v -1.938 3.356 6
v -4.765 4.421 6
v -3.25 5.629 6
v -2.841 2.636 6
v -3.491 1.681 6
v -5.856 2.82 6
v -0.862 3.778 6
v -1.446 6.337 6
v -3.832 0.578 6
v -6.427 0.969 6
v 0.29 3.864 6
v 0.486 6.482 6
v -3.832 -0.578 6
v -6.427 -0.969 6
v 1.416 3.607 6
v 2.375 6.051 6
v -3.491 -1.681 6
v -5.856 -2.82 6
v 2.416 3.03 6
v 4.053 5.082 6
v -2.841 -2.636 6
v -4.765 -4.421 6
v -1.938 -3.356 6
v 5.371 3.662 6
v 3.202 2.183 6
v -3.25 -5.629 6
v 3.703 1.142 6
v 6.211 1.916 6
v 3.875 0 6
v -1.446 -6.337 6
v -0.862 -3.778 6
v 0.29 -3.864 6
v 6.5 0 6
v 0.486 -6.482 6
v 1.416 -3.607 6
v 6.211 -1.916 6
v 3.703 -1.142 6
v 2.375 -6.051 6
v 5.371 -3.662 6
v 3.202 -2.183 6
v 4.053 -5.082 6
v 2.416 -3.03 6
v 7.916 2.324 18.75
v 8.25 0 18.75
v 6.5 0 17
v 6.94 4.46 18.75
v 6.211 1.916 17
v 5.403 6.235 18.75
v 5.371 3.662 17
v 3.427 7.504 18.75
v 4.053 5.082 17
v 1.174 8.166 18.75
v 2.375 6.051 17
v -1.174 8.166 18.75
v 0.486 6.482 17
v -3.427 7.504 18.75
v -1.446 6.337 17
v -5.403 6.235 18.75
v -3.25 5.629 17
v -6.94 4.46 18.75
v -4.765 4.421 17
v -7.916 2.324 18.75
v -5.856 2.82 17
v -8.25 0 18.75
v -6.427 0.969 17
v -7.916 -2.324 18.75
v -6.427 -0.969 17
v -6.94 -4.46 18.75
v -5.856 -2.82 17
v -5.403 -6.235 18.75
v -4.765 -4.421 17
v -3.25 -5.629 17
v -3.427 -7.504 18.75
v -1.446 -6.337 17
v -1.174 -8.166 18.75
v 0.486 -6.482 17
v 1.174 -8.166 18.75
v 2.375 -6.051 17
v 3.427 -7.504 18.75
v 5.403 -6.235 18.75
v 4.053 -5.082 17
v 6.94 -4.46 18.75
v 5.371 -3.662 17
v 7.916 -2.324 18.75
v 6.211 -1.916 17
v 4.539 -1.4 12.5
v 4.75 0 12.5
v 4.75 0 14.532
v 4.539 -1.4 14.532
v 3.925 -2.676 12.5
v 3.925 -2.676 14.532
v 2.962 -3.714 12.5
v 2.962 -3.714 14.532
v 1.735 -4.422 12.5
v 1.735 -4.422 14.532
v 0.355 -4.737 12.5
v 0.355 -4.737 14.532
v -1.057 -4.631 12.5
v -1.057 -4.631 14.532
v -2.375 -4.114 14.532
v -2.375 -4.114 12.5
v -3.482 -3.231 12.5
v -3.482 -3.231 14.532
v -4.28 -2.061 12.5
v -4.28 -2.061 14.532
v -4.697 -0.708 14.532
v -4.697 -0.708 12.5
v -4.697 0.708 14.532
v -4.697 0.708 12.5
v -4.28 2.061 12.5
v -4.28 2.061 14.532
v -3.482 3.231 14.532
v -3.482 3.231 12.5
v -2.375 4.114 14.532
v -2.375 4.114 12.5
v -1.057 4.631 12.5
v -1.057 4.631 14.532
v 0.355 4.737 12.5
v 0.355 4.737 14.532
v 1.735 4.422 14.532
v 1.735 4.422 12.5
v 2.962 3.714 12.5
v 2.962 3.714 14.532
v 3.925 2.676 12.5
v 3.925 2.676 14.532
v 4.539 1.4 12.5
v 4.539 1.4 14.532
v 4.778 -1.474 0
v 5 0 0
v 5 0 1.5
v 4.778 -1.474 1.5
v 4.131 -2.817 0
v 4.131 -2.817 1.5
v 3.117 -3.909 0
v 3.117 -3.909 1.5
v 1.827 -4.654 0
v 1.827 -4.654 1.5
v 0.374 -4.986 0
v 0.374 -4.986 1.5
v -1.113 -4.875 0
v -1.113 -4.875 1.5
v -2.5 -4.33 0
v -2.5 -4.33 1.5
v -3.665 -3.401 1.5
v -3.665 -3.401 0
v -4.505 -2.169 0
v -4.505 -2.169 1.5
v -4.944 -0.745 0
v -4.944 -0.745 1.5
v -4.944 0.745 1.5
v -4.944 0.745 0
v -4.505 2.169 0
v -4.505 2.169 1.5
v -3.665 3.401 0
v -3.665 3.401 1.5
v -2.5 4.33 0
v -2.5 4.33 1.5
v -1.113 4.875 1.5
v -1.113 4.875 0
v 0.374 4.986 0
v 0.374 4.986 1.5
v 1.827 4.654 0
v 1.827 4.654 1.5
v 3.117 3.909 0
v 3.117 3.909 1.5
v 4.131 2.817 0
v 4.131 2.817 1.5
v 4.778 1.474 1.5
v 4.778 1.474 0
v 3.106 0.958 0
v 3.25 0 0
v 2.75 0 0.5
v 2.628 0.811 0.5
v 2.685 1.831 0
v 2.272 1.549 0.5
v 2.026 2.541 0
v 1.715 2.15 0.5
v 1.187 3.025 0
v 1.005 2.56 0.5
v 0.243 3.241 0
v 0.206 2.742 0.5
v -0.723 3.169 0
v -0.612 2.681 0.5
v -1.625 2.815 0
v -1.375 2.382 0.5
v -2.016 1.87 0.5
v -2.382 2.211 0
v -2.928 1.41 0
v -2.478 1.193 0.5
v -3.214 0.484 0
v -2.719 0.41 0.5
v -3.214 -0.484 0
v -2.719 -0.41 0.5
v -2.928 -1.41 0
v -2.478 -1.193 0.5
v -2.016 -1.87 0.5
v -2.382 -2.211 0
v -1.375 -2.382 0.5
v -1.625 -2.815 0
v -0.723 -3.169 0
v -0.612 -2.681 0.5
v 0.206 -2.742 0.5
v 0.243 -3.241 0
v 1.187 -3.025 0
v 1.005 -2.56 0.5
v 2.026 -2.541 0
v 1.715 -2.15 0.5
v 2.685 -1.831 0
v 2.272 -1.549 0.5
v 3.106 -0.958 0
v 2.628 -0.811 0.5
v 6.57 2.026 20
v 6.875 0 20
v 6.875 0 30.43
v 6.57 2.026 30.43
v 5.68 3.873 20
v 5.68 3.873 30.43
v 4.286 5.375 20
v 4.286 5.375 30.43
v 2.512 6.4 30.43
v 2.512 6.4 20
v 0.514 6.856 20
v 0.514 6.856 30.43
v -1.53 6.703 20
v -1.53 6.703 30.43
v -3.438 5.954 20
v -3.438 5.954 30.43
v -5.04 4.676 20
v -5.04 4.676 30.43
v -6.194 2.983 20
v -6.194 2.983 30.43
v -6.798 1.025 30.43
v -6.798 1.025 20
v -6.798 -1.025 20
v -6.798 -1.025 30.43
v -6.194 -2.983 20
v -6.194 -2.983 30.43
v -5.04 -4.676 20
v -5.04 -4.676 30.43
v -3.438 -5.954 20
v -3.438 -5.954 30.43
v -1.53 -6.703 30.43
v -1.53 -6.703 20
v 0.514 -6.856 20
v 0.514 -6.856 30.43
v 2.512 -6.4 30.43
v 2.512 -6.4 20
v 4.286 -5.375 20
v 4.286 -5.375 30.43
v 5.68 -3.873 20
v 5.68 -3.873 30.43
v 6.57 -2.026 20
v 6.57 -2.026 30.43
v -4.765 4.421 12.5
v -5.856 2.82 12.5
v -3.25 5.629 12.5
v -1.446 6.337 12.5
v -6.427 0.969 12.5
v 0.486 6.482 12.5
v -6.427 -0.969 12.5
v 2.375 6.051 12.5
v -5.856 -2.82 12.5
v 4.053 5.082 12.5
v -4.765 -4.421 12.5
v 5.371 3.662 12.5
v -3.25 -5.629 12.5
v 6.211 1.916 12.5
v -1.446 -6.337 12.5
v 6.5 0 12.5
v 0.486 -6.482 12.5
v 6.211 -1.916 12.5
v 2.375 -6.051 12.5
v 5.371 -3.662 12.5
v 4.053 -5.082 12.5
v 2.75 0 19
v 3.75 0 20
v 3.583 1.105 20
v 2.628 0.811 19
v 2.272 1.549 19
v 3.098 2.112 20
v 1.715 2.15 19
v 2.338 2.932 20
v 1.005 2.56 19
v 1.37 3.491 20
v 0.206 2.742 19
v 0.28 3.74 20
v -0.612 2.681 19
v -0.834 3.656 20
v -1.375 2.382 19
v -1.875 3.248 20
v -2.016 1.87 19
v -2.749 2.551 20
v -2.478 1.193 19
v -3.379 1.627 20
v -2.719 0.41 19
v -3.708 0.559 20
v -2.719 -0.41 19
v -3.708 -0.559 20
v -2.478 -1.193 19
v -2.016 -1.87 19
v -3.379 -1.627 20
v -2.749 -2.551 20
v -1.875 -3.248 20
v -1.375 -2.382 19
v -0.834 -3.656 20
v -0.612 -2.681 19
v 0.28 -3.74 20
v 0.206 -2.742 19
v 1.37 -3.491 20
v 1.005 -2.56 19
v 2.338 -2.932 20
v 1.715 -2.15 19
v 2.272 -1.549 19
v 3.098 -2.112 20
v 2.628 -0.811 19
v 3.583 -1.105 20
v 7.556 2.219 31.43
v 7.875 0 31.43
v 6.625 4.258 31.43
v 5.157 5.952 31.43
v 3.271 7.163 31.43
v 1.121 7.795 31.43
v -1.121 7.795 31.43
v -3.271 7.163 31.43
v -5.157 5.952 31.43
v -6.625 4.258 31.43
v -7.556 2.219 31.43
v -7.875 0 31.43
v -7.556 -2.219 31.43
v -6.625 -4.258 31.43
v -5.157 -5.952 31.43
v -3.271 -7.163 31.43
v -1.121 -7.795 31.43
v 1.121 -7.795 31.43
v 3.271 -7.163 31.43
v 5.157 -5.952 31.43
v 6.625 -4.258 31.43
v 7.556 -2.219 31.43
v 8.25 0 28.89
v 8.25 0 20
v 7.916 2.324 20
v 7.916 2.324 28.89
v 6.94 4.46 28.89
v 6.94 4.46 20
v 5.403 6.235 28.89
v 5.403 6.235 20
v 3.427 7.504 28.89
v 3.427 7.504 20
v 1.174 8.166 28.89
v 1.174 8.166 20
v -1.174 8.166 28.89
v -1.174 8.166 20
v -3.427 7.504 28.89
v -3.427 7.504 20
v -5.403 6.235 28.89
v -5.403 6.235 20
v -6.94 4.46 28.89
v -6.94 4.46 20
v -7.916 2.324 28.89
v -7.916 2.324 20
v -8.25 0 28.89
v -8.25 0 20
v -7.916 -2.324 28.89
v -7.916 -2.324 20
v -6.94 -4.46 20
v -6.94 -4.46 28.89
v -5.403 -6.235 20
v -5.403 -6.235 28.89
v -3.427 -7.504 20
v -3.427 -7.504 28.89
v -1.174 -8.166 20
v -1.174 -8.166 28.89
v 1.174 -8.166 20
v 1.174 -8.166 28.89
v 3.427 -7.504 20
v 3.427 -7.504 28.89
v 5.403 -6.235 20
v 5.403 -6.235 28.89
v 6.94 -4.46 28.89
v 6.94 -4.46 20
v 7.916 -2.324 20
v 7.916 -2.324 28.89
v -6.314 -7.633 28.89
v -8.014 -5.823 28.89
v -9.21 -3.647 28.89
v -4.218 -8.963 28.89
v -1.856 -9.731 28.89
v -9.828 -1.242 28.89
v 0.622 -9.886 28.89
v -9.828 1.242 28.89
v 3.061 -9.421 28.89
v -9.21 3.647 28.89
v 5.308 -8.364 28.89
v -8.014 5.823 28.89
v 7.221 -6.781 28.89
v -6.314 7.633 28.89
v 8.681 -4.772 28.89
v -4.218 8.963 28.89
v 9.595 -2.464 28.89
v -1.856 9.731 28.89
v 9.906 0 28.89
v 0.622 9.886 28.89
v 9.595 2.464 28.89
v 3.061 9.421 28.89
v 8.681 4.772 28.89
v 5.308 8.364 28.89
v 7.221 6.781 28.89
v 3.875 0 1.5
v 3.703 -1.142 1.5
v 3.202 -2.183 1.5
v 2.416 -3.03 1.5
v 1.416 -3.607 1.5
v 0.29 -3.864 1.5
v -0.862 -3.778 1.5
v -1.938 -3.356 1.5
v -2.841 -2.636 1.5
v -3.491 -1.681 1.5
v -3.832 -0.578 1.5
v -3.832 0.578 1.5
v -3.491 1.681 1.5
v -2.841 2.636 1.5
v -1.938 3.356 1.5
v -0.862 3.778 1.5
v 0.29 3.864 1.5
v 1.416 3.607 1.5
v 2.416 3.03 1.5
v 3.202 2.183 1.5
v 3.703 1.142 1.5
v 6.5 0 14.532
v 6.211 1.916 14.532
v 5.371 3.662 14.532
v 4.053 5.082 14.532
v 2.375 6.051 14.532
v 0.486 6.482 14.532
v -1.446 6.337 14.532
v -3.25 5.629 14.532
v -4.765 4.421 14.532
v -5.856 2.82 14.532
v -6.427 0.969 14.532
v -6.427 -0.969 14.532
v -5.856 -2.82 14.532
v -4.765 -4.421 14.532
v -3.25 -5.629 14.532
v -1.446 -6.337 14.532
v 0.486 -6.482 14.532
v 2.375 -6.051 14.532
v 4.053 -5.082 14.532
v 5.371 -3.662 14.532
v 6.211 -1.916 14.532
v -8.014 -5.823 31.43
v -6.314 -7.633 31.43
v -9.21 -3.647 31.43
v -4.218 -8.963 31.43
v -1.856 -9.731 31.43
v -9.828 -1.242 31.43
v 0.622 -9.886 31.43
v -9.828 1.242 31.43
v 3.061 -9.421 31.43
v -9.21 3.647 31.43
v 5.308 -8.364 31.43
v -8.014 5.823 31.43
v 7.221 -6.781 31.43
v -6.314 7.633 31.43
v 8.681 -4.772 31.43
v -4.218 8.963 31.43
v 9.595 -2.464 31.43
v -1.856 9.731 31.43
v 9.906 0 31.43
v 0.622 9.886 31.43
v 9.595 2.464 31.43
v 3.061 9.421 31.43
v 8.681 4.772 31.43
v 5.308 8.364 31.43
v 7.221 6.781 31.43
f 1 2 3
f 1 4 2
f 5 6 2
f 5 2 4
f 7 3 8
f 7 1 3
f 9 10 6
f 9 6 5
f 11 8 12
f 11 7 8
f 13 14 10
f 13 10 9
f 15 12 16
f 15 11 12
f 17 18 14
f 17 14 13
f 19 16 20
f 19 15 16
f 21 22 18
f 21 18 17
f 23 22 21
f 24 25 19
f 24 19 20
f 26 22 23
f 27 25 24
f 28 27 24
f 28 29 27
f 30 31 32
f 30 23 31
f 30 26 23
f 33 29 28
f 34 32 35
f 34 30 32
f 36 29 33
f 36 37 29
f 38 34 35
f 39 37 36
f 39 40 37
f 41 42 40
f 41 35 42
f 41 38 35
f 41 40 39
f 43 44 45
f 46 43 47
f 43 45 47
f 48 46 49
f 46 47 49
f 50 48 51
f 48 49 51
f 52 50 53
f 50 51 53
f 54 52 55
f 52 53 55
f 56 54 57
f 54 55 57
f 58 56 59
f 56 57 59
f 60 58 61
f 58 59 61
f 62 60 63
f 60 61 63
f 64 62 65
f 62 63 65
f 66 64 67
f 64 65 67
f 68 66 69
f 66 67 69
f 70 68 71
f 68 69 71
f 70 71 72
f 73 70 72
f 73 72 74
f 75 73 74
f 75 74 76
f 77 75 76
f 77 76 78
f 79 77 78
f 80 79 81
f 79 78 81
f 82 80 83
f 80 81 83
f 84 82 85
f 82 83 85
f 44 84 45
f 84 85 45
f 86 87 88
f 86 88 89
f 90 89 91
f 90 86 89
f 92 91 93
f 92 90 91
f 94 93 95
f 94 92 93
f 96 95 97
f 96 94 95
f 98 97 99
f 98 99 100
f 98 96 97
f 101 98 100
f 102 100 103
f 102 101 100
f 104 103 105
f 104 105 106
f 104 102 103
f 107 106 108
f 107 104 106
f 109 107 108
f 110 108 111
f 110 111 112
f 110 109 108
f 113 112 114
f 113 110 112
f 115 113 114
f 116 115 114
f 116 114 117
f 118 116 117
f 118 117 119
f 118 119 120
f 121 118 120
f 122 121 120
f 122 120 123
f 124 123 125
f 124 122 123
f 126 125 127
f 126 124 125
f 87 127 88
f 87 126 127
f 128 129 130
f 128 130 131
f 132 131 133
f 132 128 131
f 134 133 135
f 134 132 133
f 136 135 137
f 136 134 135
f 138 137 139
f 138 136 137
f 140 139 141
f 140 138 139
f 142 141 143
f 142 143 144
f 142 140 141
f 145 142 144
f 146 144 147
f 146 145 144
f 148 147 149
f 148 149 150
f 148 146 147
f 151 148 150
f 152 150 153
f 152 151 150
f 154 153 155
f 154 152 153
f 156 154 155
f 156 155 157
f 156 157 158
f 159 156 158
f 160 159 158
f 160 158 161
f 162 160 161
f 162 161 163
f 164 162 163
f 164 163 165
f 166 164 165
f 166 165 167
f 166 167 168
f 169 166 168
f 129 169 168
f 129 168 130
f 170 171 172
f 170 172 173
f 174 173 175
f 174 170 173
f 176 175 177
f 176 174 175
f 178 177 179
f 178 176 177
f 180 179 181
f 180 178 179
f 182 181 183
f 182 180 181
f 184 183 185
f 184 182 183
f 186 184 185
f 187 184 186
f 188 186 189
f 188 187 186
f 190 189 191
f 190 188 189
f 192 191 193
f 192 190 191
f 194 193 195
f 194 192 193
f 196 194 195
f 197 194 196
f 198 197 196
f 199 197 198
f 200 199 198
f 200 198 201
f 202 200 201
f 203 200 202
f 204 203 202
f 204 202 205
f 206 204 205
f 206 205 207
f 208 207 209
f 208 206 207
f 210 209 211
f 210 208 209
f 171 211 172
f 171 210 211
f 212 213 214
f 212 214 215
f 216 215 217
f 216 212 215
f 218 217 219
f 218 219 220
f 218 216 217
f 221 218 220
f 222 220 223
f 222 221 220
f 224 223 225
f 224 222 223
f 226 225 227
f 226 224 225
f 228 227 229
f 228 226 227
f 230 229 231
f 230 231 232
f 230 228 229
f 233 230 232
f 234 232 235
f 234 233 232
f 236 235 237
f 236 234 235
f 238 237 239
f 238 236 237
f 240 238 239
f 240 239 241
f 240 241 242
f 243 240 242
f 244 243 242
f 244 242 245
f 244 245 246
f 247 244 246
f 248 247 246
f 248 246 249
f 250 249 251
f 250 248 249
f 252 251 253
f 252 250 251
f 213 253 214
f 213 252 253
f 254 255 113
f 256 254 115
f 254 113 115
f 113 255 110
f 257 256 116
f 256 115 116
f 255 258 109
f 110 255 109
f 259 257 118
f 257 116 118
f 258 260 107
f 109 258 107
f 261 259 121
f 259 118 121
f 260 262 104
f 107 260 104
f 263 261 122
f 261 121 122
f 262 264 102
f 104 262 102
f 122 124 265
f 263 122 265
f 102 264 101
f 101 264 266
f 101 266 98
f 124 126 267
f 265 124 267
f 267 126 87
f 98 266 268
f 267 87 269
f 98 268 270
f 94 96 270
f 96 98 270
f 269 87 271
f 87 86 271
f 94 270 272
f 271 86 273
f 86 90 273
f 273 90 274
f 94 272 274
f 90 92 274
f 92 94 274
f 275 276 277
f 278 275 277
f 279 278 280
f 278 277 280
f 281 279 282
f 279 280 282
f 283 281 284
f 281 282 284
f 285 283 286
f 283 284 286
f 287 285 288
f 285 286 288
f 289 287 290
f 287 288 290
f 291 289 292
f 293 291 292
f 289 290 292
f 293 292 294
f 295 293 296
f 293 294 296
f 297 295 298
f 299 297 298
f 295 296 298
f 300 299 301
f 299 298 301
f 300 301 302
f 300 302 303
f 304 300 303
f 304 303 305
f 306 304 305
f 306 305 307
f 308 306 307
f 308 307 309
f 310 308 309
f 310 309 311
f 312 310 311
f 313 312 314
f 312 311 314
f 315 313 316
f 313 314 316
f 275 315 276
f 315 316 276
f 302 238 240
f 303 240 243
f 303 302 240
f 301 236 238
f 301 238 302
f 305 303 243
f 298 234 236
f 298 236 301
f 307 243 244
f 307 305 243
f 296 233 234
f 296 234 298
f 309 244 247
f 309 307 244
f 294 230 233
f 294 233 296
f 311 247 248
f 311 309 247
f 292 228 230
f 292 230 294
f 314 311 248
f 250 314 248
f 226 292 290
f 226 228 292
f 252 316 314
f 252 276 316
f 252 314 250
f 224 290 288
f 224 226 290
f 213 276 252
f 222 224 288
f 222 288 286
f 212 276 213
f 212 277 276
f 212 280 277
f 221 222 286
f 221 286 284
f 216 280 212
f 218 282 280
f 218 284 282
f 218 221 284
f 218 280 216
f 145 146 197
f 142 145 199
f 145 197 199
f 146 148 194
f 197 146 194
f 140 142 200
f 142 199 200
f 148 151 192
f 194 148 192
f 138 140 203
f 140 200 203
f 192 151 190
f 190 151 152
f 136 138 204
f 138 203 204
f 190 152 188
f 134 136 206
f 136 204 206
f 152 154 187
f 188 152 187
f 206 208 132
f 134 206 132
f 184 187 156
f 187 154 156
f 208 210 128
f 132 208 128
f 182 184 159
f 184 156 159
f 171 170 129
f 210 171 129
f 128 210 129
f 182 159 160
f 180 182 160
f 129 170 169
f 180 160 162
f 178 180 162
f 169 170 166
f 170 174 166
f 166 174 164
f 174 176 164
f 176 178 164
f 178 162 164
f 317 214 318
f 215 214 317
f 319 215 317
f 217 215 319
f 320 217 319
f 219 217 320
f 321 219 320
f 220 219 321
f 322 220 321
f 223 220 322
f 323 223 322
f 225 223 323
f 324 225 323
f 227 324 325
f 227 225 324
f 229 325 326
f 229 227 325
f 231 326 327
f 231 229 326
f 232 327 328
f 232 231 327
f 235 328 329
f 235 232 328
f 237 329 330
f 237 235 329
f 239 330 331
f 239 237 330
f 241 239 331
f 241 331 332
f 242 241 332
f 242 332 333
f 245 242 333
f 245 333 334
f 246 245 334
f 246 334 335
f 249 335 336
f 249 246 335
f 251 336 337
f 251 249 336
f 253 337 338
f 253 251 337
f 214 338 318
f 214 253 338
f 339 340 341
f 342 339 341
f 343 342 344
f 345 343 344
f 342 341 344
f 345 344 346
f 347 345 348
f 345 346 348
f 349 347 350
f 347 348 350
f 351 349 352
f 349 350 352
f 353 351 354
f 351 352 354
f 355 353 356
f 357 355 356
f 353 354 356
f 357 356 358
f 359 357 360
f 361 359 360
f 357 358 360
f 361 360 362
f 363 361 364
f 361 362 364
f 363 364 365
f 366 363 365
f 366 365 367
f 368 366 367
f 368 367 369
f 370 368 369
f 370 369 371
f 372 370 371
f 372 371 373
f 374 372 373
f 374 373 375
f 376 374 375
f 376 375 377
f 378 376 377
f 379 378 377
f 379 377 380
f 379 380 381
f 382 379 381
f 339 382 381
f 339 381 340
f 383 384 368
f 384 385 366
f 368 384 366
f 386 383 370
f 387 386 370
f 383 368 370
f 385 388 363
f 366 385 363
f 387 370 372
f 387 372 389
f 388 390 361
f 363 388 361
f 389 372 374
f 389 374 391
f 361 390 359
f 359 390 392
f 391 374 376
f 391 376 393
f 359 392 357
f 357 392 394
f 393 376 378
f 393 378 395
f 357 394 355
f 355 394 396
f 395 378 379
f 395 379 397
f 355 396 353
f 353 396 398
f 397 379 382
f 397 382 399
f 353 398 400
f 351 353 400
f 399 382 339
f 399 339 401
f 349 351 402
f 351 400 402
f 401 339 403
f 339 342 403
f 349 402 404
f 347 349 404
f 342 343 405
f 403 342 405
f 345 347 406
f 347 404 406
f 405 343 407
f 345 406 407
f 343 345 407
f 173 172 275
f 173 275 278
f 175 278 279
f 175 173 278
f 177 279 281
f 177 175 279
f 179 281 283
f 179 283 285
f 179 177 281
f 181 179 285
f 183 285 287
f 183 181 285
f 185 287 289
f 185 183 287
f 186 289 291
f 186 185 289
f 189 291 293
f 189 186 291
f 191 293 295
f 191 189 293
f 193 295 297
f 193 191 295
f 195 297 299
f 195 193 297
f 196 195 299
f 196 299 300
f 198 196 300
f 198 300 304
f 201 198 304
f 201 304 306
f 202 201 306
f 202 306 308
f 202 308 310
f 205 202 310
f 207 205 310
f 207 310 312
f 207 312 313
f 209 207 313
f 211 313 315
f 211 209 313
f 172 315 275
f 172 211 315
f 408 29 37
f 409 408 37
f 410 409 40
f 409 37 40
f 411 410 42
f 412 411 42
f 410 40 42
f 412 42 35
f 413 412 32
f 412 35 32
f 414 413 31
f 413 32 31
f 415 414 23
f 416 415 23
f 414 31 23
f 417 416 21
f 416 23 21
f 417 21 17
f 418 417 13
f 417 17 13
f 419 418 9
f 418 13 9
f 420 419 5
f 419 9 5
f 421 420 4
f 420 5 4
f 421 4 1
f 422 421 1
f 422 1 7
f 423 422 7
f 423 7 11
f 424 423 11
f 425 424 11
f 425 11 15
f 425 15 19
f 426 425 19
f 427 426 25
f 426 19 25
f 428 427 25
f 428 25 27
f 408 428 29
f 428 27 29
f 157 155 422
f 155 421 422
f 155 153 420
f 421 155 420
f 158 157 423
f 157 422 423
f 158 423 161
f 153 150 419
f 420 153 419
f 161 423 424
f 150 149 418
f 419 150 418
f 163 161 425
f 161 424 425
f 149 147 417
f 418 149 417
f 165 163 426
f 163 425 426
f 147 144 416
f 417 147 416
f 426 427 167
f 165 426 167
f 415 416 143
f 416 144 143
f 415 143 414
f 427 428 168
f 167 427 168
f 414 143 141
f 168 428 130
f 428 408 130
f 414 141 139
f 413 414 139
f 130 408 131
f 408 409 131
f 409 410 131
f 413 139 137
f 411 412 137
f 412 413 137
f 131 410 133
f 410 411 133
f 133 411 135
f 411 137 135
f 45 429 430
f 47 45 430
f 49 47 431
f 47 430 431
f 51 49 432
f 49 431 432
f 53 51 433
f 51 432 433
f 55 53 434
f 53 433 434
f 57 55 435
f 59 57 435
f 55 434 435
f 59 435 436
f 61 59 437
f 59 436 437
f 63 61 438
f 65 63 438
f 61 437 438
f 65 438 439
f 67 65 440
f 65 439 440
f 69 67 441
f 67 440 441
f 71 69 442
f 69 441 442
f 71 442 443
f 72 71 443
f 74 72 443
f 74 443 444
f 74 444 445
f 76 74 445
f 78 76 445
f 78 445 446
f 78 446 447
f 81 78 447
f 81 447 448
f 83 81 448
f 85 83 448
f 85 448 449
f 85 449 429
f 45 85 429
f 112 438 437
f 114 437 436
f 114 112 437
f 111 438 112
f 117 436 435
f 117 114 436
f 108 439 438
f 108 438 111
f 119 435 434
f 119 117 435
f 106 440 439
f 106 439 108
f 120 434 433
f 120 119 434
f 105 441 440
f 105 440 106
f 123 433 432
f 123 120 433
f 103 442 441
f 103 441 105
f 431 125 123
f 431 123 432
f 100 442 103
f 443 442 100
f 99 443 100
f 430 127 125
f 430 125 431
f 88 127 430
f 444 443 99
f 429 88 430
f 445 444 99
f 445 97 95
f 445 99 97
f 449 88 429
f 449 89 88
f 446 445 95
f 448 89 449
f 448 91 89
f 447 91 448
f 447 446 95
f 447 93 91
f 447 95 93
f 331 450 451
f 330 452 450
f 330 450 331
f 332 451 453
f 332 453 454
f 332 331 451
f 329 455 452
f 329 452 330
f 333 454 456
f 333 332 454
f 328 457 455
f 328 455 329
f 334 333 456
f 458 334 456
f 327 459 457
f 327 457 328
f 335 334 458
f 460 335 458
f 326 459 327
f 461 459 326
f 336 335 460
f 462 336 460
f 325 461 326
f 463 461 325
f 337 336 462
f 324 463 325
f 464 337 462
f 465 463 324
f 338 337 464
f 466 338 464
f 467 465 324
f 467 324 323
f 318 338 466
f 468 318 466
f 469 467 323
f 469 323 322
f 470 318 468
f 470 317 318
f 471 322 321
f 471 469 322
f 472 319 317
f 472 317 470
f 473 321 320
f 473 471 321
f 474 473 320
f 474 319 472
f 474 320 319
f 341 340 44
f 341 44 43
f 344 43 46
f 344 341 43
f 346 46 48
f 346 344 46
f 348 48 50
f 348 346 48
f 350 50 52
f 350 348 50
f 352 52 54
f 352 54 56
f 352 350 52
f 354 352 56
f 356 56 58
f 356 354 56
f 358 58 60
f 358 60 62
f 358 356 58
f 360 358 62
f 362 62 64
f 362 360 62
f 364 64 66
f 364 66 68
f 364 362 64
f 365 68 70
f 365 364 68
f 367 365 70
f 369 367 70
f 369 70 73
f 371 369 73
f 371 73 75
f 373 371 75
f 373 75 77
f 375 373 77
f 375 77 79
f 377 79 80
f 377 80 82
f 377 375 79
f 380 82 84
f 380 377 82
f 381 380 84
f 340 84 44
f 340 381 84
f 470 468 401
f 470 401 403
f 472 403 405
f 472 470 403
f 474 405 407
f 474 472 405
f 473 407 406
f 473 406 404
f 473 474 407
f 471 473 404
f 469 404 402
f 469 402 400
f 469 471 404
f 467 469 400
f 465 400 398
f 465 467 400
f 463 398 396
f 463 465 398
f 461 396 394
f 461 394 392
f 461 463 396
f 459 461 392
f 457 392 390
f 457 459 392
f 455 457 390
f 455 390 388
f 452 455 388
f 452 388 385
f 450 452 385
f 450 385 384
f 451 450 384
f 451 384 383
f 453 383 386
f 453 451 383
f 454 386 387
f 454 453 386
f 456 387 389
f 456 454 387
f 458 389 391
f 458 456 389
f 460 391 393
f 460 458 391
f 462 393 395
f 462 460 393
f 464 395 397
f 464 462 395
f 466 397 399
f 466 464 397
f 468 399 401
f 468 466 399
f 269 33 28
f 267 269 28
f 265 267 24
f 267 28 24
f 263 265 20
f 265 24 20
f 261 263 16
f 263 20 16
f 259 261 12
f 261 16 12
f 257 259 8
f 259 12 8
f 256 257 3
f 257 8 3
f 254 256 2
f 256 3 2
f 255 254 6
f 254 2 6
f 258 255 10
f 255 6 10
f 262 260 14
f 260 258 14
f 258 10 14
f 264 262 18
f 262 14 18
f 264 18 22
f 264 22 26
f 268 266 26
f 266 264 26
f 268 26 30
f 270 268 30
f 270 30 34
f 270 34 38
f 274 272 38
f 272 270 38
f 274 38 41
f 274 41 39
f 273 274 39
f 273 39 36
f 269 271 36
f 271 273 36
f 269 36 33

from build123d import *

# Parameters (mm, degrees)
F0_R      = 6.5
F0_R_2    = 2.75
F1_DEPTH  = 20
F2_R      = 6.5
F2_R_2    = 5
F3_DEPTH  = 6
F4_R      = 5
F4_R_2    = 3.875
F5_DEPTH  = 4.5
F7_R      = 6.5
F7_R_2    = 4.75
F8_DEPTH  = 2.032
F9_R      = 8.25
F9_R_2    = 6.5
F10_DEPTH = 3
F11_R     = 8.25
F11_R_2   = 6.875
F12_DEPTH = 11.43
F13_R     = 9.906
F13_R_2   = 8.25
F14_DEPTH = 2.54
F15_SIZE  = 1.74999
F16_SIZE  = 1
F17_SIZE  = 0.5
F18_SIZE  = 1


# Not quite as in the source:
# - a fillet or chamfer is up to 0.001 mm smaller than in the source, because OpenCascade refuses the exact size


with BuildPart() as f1:
    # F0 (on Top) → F1 (new body)
    with BuildSketch(Plane.XY):
        Circle(F0_R)
        Circle(F0_R_2, mode=Mode.SUBTRACT)
    extrude(amount=F1_DEPTH)

    # F2 (on face) → F3 (cut)
    with BuildSketch(Plane(origin=(0, 0, 0), x_dir=(1, 0, 0), z_dir=(0, 0, -1))):
        Circle(F2_R)
        Circle(F2_R_2, mode=Mode.SUBTRACT)
    extrude(amount=-F3_DEPTH, mode=Mode.SUBTRACT)

    # F4 (on face) → F5 (cut)
    with BuildSketch(Plane(origin=(0, 0, 6), x_dir=(1, 0, 0), z_dir=(0, 0, -1))):
        Circle(F4_R)
        Circle(F4_R_2, mode=Mode.SUBTRACT)
    extrude(amount=F5_DEPTH, mode=Mode.SUBTRACT)

    # F7 (on offset) → F8 (cut)
    with BuildSketch(Plane(origin=(0, 0, 12.5), x_dir=(1, 0, 0), z_dir=(0, 0, -1))):
        Circle(F7_R)
        Circle(F7_R_2, mode=Mode.SUBTRACT)
    extrude(amount=-F8_DEPTH, mode=Mode.SUBTRACT)

    # F9 (on face) → F10 (join)
    with BuildSketch(Plane.XY.offset(20)):
        Circle(F9_R)
        Circle(F9_R_2, mode=Mode.SUBTRACT)
    extrude(amount=-F10_DEPTH)

    # F11 (on face) → F12 (join)
    with BuildSketch(Plane.XY.offset(20)):
        Circle(F11_R)
        Circle(F11_R_2, mode=Mode.SUBTRACT)
    extrude(amount=F12_DEPTH)

    # F13 (on face) → F14 (join)
    with BuildSketch(Plane.XY.offset(31.43)):
        Circle(F13_R)
        Circle(F13_R_2, mode=Mode.SUBTRACT)
    extrude(amount=-F14_DEPTH)

    # F15 (size 1.75 in the source; OpenCascade refuses exactly that, so slightly less here)
    f15_edges = [f1.edges().sort_by_distance(p)[0] for p in [
        (-8.25, 0, 17),
    ]]
    chamfer(f15_edges, length=F15_SIZE)

    # F16
    f16_edges = [f1.edges().sort_by_distance(p)[0] for p in [
        (-6.875, 0, 31.43),
    ]]
    chamfer(f16_edges, length=F16_SIZE)

    # F17
    f17_edges = [f1.edges().sort_by_distance(p)[0] for p in [
        (-2.75, 0, 0),
    ]]
    chamfer(f17_edges, length=F17_SIZE)

    # F18
    f18_edges = [f1.edges().sort_by_distance(p)[0] for p in [
        (-2.75, 0, 20),
    ]]
    chamfer(f18_edges, length=F18_SIZE)


solid = f1.part
